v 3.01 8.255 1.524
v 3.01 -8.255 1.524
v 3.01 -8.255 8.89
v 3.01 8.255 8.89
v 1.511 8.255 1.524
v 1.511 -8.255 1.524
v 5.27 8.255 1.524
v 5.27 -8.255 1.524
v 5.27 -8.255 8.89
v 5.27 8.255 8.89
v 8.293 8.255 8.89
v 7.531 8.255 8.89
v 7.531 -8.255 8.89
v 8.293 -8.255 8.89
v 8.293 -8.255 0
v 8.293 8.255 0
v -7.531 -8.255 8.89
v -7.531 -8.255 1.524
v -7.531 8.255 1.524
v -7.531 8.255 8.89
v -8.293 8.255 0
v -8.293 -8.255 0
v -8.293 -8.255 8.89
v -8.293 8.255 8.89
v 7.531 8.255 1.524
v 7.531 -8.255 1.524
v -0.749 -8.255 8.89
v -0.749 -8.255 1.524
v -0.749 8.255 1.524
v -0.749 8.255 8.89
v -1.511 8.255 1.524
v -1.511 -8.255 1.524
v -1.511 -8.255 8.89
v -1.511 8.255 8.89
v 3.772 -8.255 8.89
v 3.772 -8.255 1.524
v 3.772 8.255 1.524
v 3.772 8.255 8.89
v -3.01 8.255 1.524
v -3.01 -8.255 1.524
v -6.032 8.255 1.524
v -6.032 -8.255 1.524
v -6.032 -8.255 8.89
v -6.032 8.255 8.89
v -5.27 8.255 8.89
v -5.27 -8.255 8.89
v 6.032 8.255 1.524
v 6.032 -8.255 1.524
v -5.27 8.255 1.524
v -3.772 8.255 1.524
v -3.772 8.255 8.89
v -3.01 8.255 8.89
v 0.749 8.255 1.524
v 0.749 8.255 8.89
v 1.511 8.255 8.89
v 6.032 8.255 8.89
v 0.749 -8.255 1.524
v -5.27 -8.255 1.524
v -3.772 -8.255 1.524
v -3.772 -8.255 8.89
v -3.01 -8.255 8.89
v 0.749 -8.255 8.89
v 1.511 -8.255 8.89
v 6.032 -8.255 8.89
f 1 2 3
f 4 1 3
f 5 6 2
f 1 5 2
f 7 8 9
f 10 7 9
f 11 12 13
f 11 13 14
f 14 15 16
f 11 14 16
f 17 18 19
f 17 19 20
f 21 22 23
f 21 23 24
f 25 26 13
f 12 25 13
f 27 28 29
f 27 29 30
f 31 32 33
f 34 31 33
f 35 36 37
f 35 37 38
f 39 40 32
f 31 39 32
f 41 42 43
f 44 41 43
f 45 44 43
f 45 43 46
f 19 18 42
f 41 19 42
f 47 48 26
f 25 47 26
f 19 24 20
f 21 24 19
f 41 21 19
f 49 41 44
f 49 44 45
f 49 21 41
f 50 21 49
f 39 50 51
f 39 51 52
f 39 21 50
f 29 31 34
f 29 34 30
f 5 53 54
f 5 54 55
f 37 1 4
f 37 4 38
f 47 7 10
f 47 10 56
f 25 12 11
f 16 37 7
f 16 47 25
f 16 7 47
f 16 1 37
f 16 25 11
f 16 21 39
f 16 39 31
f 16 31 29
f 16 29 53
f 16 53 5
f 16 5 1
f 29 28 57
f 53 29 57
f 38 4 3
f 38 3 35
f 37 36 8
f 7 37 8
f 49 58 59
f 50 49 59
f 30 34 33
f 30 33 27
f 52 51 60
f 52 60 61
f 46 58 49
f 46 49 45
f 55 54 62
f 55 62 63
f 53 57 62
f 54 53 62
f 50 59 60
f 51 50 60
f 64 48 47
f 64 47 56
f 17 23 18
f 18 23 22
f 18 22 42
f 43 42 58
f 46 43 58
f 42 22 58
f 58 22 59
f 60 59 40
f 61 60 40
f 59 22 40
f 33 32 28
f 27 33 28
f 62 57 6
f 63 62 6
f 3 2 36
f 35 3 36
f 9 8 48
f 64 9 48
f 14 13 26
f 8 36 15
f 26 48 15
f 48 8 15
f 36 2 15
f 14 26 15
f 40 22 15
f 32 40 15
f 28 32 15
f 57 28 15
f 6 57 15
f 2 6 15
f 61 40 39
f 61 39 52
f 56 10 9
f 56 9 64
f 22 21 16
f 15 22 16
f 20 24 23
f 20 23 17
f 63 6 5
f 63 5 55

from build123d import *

# Parameters (mm, degrees)
F0_W     = 16.5862
F0_H     = 16.51
F1_DEPTH = 8.89
F2_W     = 1.4986
F2_H     = 7.366
F3_DEPTH = 25.4


with BuildPart() as f1:
    # F0 (on Top) → F1 (new body)
    with BuildSketch(Plane.XY):
        Rectangle(F0_W, F0_H)
    extrude(amount=F1_DEPTH)

    # F2 (on face) → F3 (cut)
    with BuildSketch(Plane.XZ.offset(8.255)):
        with Locations((0, 5.207)):
            Rectangle(F2_W, F2_H)
        with Locations((2.2606, 5.207)):
            Rectangle(F2_W, F2_H)
        with Locations((4.5212, 5.207)):
            Rectangle(F2_W, F2_H)
        with Locations((6.7818, 5.207)):
            Rectangle(F2_W, F2_H)
        with Locations((-2.2606, 5.207)):
            Rectangle(F2_W, F2_H)
        with Locations((-4.5212, 5.207)):
            Rectangle(F2_W, F2_H)
        with Locations((-6.7818, 5.207)):
            Rectangle(F2_W, F2_H)
    extrude(amount=-F3_DEPTH, mode=Mode.SUBTRACT)


solid = f1.part
